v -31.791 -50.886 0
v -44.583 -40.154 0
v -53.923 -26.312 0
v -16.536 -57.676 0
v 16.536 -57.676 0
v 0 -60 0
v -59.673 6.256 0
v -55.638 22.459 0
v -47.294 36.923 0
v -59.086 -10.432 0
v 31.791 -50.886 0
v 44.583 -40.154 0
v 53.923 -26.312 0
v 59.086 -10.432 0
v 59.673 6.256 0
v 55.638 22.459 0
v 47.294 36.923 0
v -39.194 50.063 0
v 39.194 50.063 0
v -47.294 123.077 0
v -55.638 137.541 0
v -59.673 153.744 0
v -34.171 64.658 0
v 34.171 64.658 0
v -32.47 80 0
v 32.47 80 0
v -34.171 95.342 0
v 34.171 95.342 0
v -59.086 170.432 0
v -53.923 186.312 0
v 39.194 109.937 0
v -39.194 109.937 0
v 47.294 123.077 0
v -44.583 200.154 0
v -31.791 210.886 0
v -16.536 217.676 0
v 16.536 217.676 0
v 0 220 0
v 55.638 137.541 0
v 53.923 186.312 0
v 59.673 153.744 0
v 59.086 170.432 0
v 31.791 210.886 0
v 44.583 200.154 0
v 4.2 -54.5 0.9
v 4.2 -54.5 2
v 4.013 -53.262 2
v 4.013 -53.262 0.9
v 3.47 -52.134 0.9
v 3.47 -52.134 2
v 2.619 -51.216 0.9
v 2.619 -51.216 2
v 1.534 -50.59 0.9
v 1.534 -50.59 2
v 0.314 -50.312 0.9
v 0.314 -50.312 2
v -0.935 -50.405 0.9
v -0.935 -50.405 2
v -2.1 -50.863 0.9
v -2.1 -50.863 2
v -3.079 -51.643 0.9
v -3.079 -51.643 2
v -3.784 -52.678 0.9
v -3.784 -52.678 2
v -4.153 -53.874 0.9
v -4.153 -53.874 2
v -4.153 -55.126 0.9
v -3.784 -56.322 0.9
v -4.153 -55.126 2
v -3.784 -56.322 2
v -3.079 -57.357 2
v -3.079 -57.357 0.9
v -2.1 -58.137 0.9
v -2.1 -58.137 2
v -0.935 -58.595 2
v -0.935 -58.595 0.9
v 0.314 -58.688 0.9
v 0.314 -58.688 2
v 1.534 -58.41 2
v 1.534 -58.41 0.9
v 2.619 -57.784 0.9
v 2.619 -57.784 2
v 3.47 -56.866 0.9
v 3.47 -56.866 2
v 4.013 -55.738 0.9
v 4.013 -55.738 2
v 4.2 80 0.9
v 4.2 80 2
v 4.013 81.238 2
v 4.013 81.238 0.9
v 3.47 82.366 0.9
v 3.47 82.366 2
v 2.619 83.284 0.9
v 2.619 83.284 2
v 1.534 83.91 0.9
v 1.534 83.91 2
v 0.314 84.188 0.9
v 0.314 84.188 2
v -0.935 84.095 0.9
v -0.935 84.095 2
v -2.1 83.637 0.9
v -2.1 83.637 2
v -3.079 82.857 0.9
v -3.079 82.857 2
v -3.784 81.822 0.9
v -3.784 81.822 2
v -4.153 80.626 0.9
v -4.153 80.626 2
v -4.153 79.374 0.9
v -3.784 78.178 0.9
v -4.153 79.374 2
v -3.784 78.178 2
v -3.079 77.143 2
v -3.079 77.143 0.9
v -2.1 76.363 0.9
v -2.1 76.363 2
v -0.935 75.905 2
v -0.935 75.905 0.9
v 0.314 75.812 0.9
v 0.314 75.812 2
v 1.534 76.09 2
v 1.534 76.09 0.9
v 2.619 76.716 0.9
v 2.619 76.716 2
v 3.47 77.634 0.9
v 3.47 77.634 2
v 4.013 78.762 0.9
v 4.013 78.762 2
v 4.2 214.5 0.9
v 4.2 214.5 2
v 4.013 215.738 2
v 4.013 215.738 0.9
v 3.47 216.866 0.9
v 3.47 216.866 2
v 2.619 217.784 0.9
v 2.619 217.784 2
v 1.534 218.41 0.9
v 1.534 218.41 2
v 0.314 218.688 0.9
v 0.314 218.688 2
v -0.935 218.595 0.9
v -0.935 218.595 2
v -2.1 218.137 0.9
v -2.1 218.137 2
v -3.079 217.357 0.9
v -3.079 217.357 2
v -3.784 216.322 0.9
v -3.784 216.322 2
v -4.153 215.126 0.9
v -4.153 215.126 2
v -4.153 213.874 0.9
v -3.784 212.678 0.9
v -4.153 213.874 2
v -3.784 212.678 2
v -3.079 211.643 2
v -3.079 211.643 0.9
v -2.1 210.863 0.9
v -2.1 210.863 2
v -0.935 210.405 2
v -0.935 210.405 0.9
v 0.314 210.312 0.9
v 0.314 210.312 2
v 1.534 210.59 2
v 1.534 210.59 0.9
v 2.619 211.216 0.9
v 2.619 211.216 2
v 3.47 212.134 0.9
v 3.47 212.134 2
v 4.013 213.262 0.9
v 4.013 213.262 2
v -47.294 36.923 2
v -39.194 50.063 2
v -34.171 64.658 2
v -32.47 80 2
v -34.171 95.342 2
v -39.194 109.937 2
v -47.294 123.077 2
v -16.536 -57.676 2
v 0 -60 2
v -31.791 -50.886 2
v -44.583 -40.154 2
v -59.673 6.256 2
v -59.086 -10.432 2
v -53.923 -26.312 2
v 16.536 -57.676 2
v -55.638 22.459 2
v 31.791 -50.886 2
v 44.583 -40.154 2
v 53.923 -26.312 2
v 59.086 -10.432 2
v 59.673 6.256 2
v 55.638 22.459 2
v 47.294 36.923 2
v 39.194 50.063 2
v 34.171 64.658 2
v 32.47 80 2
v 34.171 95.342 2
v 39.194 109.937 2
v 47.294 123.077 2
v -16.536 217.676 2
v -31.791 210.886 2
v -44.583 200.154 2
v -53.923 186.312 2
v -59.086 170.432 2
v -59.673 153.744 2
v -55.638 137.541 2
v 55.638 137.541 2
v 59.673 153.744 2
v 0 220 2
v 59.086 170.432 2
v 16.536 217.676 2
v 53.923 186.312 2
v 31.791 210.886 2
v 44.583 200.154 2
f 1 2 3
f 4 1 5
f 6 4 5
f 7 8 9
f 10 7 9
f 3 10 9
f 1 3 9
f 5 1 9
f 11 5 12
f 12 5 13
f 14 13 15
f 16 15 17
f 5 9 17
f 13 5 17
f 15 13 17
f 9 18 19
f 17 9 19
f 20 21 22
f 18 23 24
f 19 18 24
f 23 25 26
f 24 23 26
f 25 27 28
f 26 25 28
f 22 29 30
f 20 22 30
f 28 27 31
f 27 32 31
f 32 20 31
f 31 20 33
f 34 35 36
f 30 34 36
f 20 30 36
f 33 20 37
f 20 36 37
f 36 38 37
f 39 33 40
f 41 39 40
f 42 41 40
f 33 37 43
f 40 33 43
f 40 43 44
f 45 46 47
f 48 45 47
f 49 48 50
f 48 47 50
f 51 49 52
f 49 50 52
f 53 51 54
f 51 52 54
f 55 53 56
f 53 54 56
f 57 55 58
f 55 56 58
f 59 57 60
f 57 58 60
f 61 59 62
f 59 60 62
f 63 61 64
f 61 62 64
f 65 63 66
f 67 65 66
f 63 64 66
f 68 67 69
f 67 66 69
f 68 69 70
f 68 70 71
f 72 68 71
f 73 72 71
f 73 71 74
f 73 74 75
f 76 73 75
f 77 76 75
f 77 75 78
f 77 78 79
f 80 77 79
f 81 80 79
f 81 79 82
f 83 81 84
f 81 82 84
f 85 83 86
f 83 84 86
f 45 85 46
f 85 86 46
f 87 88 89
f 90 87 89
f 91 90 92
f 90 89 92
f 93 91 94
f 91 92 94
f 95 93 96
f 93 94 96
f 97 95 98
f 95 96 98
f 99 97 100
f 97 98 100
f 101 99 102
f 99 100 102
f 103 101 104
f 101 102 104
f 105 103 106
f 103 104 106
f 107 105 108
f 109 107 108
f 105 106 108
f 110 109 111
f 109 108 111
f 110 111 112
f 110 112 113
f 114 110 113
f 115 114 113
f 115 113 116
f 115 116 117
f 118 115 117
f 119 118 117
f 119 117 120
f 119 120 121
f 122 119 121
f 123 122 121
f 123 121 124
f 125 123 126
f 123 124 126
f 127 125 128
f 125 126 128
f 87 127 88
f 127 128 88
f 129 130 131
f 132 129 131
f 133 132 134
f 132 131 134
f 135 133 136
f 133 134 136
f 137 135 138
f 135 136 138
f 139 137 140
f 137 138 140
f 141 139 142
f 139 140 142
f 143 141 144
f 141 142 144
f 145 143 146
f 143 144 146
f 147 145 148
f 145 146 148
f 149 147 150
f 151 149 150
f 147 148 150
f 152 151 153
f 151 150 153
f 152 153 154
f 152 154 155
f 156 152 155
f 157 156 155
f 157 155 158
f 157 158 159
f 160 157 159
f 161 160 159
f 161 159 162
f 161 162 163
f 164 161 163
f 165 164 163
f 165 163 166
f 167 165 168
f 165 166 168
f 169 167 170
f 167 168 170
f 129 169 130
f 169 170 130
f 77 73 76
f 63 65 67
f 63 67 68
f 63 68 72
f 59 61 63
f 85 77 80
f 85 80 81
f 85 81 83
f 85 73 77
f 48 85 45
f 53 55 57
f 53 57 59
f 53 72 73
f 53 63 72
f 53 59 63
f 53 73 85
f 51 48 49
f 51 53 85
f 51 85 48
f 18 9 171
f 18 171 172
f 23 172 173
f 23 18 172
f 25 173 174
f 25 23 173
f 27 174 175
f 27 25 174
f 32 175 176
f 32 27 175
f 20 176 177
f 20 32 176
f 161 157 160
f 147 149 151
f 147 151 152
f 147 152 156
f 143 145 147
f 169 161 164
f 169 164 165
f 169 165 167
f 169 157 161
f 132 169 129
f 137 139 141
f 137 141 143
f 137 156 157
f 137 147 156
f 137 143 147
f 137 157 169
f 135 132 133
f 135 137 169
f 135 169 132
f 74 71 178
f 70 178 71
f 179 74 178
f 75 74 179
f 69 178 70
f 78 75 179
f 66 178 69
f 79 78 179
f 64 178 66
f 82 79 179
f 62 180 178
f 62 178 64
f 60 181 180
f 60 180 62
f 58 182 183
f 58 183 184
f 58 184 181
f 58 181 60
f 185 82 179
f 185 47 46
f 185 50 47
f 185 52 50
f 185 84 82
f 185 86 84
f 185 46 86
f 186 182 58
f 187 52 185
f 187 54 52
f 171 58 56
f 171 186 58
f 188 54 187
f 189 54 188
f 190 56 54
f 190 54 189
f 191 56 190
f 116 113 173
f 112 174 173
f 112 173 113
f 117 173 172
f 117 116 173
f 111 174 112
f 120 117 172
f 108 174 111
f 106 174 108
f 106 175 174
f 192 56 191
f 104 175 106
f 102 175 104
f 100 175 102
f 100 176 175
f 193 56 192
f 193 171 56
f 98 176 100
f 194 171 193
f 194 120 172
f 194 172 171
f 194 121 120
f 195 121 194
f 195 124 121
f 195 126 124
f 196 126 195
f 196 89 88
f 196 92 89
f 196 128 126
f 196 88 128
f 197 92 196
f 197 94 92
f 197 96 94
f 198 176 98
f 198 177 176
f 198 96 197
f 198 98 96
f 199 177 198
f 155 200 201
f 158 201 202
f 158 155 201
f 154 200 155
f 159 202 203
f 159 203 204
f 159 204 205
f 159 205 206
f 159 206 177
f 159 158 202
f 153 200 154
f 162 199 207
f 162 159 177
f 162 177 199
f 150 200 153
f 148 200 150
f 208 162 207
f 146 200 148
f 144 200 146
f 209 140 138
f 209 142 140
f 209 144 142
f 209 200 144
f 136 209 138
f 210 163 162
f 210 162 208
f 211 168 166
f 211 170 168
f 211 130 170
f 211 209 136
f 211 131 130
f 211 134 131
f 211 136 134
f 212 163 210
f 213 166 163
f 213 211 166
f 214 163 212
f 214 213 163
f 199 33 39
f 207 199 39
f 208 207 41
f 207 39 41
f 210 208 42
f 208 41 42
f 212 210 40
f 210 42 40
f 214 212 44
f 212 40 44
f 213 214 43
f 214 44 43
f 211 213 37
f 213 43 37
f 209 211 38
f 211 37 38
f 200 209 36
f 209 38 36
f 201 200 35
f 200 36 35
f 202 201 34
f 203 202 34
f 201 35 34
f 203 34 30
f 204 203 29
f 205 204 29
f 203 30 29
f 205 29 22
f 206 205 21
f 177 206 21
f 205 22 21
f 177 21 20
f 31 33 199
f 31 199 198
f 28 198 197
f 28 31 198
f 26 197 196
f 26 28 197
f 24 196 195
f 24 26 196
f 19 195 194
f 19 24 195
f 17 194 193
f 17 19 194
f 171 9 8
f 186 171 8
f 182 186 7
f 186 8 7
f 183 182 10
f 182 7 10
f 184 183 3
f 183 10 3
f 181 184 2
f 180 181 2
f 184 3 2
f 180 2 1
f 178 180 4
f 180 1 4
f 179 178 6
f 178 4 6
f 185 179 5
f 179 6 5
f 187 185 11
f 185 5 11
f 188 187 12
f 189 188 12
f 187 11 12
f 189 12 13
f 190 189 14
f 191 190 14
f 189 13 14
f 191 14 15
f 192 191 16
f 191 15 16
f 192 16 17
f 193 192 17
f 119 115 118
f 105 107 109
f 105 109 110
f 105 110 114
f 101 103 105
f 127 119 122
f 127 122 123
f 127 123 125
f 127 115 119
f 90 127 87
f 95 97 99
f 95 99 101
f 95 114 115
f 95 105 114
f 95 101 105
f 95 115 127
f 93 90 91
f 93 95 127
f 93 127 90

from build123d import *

# Parameters (mm, degrees)
PAD_DEPTH    = 2
SKETCH001_R  = 4.2
POCKET_DEPTH = 1.1


with BuildPart() as part:
    # Sketch → Pad (new body)
    with BuildSketch(Plane.XY):
        with BuildLine():
            ThreePointArc((-47.293619, 36.923077), (0, -60), (47.293619, 36.923077))
            ThreePointArc((47.293619, 123.076923), (32.469508, 80), (47.293619, 36.923077))
            ThreePointArc((47.293619, 123.076923), (0, 220), (-47.293619, 123.076923))
            ThreePointArc((-47.293619, 36.923077), (-32.469508, 80), (-47.293619, 123.076923))
        make_face()
    extrude(amount=PAD_DEPTH)

    # Sketch001 (on Face6 of Pad) → Pocket (cut)
    with BuildSketch(Plane.XY.offset(2)):
        with Locations((0, -54.5)):
            Circle(SKETCH001_R)
        with Locations((0, 214.5)):
            Circle(SKETCH001_R)
        with Locations((0, 80)):
            Circle(SKETCH001_R)
    extrude(amount=-POCKET_DEPTH, mode=Mode.SUBTRACT)


solid = part.part
